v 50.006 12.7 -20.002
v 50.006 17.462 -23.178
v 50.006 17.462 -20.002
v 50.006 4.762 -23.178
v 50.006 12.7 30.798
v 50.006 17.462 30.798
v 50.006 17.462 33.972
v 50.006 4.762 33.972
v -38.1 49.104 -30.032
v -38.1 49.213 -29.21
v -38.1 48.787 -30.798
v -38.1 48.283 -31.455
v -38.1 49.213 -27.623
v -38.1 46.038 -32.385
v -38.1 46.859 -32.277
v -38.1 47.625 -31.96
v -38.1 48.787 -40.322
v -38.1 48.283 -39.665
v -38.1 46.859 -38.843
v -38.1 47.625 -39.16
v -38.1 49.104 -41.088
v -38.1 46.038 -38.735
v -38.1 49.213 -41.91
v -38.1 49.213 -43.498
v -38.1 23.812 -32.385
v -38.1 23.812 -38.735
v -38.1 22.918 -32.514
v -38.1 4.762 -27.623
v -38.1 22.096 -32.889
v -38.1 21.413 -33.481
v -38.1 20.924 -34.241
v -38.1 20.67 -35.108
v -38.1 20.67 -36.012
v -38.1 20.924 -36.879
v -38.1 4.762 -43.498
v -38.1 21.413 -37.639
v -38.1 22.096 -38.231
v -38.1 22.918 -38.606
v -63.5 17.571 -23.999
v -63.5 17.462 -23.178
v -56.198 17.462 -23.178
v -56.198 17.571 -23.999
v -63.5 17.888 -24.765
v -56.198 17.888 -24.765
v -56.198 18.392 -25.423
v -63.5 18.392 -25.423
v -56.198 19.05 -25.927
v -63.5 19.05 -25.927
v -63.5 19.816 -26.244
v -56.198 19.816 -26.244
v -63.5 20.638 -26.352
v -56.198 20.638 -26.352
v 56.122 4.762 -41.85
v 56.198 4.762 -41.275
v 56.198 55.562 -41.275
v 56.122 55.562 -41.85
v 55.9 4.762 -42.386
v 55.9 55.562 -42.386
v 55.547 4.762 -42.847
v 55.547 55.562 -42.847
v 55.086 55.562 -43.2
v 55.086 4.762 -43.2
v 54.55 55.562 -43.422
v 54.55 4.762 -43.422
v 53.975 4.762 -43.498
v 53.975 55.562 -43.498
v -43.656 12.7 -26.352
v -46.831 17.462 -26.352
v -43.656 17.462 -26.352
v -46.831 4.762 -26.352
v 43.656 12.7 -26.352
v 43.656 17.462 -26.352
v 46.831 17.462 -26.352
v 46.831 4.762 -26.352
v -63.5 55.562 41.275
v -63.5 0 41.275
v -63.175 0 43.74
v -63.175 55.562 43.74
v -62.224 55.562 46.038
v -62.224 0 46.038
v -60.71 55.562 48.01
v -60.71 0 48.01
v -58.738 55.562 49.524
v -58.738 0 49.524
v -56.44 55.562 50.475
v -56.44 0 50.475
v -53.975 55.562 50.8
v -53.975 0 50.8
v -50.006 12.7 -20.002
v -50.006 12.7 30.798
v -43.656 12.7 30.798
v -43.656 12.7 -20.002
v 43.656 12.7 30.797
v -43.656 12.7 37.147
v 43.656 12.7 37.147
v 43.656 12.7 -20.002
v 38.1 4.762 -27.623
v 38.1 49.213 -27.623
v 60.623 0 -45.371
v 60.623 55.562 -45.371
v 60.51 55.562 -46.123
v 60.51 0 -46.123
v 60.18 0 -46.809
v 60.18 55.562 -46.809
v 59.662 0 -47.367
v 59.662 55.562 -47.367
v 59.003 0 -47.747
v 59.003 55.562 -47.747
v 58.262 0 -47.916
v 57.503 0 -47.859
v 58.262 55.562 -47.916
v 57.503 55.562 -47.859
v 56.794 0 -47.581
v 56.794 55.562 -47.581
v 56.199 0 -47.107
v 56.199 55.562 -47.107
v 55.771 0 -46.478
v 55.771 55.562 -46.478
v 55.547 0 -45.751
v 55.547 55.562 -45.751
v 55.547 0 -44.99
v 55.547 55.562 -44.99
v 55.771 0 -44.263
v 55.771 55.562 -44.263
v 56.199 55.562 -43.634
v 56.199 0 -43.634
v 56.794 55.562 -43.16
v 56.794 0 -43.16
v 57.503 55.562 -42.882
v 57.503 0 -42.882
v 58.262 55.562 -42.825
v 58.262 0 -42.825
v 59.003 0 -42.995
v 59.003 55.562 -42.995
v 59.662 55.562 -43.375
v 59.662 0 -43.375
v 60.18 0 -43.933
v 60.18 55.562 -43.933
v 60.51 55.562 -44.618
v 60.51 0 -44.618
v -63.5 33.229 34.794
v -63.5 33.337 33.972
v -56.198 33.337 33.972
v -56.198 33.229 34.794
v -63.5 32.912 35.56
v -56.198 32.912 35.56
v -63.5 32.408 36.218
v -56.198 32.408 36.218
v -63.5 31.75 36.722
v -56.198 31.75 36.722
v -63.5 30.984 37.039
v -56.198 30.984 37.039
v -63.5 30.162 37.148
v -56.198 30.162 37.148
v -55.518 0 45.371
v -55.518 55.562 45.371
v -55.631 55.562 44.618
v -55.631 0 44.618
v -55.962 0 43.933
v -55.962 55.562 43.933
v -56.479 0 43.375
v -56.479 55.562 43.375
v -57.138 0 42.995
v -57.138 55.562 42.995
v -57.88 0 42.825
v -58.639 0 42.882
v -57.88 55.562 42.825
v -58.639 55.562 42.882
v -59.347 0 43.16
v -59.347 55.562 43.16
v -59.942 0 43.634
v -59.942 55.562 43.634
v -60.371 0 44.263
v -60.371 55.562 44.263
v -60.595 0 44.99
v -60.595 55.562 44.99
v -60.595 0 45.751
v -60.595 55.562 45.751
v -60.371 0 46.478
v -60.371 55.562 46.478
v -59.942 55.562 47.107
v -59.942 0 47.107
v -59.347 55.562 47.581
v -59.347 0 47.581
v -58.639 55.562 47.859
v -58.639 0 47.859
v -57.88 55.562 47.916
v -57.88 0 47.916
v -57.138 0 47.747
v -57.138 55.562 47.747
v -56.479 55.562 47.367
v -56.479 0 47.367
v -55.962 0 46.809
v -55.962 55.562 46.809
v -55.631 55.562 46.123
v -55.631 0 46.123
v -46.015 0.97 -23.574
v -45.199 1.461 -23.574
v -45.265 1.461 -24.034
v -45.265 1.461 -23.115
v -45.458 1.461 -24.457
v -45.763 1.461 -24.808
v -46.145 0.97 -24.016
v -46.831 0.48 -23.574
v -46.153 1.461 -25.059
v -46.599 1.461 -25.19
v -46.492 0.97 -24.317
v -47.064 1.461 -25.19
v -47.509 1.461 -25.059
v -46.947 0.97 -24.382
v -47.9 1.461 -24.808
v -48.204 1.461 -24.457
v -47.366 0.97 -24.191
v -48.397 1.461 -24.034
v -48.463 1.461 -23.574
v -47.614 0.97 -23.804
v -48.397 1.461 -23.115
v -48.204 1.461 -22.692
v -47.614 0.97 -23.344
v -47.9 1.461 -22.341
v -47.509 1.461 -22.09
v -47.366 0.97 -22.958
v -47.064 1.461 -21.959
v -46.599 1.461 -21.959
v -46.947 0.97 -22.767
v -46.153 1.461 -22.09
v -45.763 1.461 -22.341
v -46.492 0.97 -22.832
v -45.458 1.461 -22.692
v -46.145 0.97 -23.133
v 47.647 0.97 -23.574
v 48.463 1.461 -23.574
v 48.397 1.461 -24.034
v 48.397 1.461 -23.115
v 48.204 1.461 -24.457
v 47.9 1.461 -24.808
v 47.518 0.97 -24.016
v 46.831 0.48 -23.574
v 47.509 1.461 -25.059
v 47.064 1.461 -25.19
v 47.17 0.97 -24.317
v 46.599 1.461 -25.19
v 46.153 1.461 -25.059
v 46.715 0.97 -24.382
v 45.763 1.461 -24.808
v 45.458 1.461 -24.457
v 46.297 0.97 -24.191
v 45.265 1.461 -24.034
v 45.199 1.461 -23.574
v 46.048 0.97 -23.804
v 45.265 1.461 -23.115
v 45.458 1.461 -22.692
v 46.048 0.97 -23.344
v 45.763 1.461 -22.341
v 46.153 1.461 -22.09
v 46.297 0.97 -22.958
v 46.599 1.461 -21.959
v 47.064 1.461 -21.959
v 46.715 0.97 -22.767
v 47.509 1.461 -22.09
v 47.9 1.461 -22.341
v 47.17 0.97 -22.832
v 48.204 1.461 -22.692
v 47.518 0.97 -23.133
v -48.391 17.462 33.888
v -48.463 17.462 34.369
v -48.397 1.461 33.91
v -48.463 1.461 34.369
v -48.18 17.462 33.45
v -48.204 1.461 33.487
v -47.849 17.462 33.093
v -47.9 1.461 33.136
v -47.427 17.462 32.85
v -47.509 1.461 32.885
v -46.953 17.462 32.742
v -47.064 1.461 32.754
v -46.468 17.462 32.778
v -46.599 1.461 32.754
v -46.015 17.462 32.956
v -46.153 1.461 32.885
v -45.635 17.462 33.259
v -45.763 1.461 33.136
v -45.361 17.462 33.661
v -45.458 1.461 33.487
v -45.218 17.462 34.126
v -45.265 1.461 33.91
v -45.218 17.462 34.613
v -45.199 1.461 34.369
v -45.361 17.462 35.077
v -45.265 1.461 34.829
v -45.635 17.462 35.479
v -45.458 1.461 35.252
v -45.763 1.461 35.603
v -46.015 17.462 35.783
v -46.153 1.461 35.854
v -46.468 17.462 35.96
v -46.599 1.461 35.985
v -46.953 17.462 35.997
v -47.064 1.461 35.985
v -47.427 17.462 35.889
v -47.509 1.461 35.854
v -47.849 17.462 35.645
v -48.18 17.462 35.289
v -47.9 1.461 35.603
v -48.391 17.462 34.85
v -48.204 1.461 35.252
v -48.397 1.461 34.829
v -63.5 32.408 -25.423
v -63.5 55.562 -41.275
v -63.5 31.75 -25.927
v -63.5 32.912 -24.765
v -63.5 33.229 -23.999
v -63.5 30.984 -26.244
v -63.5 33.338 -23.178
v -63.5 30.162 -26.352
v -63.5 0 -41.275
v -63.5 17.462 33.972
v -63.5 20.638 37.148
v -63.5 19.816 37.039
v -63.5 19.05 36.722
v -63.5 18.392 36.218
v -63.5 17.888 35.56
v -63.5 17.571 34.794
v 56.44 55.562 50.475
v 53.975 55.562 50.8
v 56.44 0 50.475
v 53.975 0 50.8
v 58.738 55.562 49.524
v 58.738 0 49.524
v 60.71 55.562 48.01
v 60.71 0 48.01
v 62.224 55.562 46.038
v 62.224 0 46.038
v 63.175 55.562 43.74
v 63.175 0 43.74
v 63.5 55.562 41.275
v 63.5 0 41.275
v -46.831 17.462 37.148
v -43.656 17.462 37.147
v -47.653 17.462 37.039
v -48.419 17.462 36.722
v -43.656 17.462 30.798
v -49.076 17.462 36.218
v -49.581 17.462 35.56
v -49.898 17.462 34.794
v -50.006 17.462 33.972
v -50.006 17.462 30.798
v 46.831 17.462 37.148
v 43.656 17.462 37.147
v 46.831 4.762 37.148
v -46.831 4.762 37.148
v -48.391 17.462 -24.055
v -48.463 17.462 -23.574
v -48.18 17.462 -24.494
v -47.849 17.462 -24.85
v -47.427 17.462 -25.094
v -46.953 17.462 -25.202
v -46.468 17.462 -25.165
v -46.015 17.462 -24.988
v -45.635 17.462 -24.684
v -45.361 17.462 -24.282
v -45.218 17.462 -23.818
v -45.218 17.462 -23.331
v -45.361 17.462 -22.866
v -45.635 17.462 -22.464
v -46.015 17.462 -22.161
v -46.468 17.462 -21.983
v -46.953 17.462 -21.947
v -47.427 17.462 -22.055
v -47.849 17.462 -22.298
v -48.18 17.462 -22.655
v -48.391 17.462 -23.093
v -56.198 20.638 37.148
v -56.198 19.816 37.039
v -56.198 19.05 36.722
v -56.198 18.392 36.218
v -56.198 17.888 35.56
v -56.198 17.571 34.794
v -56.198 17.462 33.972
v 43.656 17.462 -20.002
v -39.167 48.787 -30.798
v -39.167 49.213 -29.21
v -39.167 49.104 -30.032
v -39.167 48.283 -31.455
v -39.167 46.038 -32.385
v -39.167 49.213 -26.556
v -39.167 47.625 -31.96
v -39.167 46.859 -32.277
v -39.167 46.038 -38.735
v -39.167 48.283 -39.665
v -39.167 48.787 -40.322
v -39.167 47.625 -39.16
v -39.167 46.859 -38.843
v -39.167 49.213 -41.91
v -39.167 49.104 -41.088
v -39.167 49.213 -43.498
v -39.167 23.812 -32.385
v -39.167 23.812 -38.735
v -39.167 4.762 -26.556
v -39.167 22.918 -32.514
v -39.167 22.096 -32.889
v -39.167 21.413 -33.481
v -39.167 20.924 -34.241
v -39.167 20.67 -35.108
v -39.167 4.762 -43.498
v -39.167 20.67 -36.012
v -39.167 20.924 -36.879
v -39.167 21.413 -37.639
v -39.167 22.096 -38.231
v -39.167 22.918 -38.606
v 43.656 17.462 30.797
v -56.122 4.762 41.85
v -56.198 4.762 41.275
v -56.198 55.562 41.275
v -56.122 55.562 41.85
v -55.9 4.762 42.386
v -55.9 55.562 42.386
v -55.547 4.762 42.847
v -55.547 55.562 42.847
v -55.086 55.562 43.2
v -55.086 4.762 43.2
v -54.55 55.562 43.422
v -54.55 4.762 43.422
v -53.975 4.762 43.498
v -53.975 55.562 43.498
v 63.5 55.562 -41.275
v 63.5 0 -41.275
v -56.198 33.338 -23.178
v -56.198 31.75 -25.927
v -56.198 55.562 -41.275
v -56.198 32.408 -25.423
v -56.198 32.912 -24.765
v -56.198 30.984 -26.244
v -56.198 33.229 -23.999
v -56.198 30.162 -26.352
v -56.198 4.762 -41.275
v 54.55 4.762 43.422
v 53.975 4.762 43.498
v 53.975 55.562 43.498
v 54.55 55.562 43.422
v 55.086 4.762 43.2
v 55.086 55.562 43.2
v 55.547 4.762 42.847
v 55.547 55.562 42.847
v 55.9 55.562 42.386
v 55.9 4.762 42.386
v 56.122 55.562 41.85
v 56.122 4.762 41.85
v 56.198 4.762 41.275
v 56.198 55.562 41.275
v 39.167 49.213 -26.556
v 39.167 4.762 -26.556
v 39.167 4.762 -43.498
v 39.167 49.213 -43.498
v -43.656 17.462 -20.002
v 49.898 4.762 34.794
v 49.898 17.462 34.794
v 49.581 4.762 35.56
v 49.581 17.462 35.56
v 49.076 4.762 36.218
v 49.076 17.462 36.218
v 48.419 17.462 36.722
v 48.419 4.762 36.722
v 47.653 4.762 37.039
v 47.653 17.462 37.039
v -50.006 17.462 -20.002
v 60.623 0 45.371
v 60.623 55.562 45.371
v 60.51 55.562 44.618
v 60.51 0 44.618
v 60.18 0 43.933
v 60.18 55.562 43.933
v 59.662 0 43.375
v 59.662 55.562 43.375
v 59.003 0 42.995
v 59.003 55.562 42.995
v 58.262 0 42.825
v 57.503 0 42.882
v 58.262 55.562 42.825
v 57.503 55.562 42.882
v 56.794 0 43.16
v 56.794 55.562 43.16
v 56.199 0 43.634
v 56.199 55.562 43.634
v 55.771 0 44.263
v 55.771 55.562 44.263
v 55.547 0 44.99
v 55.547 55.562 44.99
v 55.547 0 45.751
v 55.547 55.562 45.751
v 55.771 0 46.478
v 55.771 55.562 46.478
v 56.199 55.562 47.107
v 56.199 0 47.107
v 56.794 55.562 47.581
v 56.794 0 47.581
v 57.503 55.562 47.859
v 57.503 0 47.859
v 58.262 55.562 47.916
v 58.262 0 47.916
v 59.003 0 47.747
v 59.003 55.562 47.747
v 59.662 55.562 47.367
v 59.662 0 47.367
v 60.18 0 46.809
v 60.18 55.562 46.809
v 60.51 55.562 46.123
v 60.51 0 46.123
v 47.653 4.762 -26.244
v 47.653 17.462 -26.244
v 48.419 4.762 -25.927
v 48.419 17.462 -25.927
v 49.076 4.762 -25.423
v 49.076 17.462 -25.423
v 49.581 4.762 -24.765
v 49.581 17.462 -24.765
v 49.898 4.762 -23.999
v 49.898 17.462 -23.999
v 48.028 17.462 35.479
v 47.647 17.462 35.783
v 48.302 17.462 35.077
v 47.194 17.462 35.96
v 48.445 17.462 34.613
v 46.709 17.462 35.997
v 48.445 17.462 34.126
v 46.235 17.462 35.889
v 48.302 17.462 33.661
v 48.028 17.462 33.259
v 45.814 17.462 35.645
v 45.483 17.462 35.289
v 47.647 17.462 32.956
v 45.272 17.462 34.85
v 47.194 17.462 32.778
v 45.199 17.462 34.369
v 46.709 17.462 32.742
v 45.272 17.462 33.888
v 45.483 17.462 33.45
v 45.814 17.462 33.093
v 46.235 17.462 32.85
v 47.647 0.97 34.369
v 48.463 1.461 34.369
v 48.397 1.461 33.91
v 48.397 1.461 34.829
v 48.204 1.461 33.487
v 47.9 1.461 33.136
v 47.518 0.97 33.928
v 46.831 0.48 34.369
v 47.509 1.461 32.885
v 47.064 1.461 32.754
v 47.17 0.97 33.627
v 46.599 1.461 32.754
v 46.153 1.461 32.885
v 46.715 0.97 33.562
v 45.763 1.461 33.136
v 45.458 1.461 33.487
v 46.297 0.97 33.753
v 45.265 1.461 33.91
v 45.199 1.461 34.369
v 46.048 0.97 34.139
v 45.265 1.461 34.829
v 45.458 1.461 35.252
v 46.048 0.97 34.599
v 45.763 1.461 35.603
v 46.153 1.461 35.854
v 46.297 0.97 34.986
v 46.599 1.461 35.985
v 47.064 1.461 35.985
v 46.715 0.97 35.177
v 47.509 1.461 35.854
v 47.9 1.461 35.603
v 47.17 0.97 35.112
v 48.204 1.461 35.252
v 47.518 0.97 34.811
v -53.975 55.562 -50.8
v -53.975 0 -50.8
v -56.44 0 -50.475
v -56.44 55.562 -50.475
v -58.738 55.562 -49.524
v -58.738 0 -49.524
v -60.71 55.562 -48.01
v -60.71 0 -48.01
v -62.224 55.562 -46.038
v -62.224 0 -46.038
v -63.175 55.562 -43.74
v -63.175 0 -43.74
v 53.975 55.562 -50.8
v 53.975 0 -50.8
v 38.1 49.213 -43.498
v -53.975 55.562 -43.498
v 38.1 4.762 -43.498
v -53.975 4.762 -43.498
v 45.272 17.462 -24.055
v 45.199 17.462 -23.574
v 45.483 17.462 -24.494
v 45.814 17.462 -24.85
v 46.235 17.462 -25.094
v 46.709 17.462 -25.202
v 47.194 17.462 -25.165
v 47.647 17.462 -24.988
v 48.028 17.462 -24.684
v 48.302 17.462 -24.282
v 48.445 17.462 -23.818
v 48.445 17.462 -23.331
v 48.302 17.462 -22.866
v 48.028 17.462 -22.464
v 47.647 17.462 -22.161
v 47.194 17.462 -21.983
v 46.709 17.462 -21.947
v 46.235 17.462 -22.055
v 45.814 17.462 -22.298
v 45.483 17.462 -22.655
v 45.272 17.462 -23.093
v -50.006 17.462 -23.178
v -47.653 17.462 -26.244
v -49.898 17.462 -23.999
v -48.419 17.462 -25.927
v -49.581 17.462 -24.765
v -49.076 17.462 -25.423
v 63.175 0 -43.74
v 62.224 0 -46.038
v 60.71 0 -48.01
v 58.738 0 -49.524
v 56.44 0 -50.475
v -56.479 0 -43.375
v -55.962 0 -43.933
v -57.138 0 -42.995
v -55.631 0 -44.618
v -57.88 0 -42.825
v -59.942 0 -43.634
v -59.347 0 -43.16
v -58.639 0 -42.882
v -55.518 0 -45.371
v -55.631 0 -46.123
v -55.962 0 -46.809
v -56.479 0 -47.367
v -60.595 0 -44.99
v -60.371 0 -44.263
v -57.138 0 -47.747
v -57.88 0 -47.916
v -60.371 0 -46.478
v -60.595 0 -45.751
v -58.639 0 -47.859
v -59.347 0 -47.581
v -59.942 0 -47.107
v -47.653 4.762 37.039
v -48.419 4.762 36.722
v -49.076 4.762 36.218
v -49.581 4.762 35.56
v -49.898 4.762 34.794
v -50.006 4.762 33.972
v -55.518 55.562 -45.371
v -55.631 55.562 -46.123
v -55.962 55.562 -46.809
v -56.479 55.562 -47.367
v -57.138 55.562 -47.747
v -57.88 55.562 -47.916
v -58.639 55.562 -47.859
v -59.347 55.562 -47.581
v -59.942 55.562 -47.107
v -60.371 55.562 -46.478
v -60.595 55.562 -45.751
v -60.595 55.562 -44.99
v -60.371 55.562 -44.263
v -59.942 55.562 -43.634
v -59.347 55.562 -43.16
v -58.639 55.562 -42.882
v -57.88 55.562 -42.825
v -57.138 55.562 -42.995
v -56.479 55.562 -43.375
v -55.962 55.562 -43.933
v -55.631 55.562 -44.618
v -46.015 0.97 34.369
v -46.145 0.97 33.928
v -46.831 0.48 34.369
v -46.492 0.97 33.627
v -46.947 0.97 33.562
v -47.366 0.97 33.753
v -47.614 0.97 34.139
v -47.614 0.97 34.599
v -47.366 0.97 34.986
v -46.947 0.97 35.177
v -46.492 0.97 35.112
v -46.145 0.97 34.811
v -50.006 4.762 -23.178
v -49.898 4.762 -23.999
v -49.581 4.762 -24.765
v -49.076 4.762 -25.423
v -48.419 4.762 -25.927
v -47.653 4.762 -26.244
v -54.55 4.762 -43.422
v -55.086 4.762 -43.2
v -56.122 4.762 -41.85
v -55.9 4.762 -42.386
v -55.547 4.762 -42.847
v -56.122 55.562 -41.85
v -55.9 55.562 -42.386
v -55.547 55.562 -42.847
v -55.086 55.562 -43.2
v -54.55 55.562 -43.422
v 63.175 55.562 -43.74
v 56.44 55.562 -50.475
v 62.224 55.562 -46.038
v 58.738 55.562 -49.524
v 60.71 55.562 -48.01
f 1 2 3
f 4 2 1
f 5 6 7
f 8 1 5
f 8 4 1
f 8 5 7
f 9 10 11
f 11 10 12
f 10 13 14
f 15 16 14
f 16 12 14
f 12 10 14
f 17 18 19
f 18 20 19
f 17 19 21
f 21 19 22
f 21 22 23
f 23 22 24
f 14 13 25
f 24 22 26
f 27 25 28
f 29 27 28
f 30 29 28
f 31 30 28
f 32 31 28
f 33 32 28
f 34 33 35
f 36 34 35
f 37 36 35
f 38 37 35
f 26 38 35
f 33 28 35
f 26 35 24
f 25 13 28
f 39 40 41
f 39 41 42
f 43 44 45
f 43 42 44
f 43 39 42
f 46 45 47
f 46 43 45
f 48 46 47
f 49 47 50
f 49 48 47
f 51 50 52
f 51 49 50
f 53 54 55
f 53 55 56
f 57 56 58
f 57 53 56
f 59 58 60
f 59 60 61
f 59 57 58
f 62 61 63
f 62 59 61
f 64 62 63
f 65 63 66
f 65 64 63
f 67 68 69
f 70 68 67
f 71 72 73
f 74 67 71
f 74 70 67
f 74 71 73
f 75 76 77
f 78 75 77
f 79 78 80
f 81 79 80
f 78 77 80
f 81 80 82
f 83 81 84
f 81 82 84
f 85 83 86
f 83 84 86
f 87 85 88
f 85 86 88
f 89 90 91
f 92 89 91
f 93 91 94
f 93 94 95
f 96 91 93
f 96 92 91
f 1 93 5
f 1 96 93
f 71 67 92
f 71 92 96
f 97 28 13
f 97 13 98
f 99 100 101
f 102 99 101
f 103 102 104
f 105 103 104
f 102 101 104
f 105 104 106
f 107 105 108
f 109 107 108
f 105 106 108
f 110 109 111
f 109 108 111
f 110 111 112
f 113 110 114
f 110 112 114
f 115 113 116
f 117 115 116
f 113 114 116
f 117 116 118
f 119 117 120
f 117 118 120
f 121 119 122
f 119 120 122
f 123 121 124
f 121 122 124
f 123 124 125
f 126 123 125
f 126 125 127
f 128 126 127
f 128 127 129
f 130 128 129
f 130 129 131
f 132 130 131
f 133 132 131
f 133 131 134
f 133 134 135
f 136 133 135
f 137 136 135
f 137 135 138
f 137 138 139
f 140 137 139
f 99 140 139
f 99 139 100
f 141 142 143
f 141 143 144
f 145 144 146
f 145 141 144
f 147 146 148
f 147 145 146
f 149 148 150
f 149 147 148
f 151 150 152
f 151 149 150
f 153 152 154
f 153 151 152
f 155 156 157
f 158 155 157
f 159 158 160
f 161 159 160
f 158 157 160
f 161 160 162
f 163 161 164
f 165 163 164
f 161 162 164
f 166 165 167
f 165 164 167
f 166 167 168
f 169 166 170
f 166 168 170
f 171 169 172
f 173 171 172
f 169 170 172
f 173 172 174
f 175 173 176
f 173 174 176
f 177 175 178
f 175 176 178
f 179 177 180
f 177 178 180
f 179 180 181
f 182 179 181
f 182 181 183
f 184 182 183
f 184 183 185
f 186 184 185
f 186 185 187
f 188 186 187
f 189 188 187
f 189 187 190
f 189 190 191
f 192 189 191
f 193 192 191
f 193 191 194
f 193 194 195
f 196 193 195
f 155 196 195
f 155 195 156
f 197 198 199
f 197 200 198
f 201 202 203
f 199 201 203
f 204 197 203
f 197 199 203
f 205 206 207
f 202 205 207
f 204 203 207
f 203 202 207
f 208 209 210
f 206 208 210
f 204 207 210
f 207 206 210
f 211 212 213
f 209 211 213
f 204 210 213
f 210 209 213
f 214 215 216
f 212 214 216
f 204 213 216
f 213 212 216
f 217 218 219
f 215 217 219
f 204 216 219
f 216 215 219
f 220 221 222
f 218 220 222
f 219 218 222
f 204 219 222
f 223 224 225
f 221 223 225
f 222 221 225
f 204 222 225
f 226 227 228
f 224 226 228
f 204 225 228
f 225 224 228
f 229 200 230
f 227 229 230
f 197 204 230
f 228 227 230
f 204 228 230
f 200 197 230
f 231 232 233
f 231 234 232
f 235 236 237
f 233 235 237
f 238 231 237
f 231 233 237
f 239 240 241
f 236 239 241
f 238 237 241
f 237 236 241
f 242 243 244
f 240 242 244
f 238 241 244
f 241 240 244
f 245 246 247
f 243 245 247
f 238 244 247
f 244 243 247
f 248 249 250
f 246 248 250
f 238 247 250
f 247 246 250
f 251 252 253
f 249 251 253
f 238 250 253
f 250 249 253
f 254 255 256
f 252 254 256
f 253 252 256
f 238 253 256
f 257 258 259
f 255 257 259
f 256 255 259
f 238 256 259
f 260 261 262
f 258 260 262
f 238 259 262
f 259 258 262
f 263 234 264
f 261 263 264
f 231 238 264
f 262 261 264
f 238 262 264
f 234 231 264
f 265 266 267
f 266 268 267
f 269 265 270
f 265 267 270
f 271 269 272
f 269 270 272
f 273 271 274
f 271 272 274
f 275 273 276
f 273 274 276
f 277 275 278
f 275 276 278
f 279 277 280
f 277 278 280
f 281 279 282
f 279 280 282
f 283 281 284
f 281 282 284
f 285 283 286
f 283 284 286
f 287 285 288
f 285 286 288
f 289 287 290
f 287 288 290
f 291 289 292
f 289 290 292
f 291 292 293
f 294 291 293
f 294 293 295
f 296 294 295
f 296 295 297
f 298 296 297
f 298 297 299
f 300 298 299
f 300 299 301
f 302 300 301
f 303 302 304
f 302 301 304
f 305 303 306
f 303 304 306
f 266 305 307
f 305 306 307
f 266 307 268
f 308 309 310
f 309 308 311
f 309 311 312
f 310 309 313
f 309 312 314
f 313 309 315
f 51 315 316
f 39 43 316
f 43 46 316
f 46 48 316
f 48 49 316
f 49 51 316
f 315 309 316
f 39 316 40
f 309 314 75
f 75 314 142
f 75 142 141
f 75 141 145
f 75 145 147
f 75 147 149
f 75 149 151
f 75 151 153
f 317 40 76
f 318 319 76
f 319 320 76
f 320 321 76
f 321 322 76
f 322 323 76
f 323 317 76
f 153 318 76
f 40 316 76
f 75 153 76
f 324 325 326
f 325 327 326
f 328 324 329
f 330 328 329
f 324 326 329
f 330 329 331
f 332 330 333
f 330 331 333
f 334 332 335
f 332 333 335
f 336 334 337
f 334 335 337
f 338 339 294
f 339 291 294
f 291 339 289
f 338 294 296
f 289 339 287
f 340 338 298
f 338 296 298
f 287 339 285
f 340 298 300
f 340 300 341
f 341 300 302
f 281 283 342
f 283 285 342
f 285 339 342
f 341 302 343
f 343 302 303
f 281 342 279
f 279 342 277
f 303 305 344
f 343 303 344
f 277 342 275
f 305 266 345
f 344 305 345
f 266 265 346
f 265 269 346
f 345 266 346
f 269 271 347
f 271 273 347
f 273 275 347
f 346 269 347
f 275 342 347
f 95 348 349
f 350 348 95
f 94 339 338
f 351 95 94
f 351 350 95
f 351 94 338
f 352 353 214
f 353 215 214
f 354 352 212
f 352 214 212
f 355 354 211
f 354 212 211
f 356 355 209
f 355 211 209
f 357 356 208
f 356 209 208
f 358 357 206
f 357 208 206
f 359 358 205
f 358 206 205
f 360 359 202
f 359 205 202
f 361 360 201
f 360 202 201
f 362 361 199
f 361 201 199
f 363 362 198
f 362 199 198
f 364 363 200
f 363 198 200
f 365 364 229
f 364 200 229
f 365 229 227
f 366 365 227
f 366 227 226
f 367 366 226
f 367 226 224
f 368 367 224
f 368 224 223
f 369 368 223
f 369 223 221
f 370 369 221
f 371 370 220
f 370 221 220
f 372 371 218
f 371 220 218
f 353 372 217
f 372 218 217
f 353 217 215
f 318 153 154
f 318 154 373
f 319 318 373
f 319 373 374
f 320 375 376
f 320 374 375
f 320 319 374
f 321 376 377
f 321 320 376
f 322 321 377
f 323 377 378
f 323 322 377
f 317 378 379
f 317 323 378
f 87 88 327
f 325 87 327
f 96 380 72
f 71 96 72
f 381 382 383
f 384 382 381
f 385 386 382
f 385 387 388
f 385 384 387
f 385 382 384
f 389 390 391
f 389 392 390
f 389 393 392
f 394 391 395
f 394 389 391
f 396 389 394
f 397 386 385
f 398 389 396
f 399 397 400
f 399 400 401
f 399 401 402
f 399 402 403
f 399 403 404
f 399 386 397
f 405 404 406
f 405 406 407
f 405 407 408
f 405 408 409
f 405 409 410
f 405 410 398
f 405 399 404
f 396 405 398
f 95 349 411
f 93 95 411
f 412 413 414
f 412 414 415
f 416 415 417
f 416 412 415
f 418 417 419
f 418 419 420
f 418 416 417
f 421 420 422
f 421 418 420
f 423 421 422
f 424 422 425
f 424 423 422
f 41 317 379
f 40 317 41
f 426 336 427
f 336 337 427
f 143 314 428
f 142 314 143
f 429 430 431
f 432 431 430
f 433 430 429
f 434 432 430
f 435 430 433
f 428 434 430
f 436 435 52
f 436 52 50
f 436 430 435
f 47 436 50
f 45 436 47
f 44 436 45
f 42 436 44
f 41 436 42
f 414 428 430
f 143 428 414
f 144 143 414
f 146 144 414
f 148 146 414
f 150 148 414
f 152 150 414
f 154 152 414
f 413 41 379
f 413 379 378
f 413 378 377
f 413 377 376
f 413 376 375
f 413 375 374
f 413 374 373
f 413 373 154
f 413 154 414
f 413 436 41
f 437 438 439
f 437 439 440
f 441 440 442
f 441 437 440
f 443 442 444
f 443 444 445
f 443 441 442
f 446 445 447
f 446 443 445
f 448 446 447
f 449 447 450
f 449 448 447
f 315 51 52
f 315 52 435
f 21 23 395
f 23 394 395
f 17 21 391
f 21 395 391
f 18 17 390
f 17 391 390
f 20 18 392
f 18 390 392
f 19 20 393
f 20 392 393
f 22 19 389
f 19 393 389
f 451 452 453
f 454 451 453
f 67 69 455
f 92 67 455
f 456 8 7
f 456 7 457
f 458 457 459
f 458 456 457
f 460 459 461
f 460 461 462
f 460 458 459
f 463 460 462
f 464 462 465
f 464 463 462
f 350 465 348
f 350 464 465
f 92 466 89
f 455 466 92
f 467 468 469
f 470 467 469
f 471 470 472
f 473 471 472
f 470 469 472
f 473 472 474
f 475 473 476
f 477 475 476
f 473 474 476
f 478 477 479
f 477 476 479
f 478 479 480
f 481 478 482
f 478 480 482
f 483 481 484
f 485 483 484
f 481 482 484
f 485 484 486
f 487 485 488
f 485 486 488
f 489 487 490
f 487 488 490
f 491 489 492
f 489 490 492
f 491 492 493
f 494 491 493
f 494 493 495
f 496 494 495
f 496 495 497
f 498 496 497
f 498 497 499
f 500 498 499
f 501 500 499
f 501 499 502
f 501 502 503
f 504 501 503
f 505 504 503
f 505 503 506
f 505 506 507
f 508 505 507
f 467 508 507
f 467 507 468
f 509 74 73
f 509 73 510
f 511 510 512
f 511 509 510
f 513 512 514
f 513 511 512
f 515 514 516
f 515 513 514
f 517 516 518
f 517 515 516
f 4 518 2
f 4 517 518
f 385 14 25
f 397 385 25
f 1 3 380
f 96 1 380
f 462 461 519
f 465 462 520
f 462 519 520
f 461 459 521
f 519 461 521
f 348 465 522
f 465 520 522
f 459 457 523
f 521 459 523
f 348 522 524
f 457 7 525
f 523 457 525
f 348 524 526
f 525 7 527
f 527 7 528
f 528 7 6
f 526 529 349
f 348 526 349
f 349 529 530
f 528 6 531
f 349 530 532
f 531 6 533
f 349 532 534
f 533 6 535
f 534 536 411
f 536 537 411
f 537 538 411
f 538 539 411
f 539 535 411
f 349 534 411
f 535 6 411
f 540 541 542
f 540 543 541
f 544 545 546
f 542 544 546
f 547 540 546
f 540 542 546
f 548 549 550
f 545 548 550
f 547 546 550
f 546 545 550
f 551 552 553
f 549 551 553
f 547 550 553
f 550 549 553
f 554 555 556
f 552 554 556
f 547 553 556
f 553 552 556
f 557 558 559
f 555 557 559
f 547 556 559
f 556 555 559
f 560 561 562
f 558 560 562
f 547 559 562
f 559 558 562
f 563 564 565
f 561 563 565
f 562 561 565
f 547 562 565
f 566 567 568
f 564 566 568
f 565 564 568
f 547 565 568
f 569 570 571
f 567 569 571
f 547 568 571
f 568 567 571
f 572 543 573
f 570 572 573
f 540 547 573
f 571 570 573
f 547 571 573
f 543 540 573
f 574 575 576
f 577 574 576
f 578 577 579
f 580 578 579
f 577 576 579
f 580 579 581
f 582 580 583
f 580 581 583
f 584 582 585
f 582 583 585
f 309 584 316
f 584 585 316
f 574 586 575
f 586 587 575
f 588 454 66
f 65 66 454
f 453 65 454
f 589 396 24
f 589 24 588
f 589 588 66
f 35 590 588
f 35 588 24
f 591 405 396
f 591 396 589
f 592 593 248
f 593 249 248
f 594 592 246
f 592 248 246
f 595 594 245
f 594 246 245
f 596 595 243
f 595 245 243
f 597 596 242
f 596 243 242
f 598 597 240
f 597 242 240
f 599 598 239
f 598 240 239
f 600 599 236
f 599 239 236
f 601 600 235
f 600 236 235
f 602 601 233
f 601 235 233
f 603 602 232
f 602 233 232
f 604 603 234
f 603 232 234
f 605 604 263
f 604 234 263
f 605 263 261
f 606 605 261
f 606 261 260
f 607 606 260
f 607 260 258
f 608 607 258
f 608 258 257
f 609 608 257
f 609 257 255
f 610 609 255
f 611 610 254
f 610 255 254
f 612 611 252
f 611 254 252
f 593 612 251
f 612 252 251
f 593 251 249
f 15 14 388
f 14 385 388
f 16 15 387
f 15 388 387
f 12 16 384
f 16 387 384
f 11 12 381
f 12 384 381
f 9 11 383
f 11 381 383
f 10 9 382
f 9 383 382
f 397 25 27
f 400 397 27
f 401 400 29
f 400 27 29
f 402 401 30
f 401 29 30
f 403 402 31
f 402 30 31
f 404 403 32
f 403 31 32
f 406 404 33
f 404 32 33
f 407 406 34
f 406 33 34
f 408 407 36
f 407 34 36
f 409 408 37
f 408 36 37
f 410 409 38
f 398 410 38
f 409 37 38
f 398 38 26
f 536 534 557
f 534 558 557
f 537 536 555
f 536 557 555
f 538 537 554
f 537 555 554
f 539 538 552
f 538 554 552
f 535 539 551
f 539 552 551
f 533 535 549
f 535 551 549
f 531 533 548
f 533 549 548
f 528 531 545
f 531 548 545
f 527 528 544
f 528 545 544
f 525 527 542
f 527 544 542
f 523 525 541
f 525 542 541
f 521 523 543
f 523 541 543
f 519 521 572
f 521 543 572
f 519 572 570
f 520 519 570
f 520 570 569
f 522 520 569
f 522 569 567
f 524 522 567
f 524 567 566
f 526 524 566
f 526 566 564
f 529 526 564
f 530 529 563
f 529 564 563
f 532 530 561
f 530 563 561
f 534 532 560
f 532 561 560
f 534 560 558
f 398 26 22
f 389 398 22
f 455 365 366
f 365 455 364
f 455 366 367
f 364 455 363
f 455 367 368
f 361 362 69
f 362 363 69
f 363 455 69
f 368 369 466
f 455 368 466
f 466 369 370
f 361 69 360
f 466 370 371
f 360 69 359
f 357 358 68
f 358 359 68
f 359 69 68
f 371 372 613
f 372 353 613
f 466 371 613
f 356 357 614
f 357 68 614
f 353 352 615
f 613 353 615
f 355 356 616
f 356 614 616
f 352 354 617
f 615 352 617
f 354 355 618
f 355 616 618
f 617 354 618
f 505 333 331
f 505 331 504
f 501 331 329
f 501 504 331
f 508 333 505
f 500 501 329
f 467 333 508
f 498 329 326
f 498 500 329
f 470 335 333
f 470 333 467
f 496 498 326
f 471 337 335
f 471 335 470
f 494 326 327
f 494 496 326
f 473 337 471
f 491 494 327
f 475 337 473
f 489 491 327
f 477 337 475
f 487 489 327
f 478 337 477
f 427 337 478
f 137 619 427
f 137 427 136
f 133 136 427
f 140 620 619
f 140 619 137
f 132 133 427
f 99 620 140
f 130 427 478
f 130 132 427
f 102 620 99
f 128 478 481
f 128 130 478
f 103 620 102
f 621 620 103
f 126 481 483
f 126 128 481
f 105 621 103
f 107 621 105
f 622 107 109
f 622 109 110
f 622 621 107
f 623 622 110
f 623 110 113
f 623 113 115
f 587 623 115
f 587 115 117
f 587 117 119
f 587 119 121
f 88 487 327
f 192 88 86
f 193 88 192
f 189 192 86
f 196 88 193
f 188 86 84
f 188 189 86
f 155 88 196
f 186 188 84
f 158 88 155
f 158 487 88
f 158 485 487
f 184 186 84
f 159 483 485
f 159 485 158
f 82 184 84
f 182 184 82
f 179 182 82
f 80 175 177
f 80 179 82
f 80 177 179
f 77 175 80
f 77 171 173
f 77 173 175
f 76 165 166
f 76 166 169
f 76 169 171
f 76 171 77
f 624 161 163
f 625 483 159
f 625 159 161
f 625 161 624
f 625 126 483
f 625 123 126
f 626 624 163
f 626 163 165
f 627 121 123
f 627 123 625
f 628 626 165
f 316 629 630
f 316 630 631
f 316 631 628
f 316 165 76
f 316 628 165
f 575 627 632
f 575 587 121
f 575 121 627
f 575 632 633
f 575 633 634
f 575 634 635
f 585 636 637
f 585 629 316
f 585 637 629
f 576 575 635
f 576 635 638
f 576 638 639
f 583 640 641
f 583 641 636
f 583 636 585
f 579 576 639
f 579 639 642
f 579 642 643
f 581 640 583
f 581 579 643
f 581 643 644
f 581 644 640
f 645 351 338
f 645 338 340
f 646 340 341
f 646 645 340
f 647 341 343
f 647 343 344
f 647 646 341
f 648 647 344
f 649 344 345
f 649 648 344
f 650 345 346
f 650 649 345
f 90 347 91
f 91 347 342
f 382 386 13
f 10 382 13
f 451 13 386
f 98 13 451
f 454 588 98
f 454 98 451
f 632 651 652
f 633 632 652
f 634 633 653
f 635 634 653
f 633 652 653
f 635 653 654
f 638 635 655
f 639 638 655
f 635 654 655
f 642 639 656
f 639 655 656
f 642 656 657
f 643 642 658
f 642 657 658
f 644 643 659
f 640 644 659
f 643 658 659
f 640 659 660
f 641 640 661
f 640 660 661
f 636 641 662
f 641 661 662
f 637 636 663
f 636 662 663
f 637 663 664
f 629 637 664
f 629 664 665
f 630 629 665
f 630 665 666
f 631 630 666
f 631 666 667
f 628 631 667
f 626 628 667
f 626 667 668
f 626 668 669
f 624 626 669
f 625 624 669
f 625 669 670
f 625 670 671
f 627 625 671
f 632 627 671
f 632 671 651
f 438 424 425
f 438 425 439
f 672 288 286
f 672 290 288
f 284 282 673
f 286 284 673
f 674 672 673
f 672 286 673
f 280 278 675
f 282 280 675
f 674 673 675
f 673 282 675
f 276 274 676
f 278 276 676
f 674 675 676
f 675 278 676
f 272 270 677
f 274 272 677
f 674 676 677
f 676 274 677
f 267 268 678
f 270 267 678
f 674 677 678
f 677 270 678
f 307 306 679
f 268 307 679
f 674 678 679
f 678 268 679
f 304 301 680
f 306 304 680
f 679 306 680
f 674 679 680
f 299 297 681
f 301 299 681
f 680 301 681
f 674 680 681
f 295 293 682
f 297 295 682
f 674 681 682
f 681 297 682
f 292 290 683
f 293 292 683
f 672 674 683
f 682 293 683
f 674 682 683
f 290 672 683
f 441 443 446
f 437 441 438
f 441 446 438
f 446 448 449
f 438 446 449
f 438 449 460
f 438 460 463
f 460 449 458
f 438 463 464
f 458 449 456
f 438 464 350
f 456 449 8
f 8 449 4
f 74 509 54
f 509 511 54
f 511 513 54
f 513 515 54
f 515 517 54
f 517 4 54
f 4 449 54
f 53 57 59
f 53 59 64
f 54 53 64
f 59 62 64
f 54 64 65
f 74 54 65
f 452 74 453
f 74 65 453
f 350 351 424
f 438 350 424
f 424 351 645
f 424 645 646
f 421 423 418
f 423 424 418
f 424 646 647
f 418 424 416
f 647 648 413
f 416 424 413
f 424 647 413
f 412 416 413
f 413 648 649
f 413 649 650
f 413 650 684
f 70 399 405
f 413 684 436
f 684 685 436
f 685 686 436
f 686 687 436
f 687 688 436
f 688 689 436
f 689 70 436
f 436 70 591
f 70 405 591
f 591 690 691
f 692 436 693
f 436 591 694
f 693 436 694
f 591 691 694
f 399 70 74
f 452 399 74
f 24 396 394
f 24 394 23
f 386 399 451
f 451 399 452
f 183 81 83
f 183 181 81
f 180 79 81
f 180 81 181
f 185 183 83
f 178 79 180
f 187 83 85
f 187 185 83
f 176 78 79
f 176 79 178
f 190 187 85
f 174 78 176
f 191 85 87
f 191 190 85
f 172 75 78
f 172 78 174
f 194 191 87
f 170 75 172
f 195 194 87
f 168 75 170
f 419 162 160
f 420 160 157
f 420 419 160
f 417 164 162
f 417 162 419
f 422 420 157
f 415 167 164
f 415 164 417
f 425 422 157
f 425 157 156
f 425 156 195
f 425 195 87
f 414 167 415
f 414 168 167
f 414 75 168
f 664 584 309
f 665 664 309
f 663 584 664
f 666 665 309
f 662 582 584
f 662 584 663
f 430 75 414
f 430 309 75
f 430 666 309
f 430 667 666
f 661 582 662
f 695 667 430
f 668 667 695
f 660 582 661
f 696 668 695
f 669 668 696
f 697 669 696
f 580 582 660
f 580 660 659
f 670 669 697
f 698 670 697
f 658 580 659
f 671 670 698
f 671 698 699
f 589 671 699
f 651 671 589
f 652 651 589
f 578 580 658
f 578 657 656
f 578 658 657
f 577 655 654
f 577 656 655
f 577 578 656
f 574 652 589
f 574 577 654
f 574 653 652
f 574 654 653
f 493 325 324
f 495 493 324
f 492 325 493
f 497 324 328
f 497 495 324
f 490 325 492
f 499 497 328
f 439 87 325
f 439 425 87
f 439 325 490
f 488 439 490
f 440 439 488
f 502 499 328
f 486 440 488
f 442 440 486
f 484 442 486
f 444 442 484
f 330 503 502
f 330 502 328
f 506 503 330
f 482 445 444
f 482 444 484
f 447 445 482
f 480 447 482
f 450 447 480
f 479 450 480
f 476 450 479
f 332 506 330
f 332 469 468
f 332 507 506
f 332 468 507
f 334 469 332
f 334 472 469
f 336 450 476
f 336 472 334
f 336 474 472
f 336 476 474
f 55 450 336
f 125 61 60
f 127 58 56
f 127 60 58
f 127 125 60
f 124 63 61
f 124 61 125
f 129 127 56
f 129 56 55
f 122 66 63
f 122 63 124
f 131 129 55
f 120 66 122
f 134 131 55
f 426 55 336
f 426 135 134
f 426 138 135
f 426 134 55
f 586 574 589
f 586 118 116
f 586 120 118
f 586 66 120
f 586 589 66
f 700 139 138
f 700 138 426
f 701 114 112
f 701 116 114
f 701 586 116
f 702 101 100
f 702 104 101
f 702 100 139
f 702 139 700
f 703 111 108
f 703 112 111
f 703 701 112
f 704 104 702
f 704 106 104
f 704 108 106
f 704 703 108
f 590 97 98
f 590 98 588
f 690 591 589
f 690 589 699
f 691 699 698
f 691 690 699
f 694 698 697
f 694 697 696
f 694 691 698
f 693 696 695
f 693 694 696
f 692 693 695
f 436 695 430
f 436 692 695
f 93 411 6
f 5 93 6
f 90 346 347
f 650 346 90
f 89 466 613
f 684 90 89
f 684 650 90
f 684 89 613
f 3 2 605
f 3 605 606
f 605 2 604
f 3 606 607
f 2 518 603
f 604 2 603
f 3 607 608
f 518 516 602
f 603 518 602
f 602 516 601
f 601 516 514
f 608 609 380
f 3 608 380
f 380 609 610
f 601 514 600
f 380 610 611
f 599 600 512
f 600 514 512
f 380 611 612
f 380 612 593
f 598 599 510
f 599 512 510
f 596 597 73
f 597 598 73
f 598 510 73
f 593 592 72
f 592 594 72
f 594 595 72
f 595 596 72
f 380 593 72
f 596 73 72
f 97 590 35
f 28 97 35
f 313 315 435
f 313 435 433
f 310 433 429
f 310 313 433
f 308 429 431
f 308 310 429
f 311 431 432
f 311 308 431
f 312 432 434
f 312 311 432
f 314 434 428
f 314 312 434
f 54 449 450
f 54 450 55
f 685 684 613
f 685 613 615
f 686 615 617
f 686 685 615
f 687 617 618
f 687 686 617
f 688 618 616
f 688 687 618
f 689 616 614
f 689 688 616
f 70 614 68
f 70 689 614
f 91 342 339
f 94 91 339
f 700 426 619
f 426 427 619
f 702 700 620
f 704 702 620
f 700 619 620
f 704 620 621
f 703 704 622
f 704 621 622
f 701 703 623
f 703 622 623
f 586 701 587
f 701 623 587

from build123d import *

# Parameters (mm, degrees)
BASE_PLATE_DEPTH                        = 4.7625
OUTSIDEBOSS_DEPTH                       = 50.8
TOPPLATE_MOUNTINGHOLE_8_0_199_DIAMETE_D = 5.1054
PCB_PLATE_DEPTH                         = 12.7
F_4_CLEARANCE_HOLE1_D                   = 3.2639
F_4_CLEARANCE_HOLE1_DEPTH               = 16.002
F_4_CLEARANCE_HOLE1_TIP                 = 0.980574487
SKETCH11_W                              = 87.3125
SKETCH11_H                              = 50.8
SKETCH11_W_2                            = 6.35
SKETCH11_H_2                            = 6.35
CUT_EXTRUDE2_DEPTH                      = 4.7625
SKETCH12_W                              = 78.3336
SKETCH12_H                              = 18.0086
SKETCH12_W_2                            = 76.2
SKETCH12_H_2                            = 15.875
BATTERYHOLDER_DEPTH                     = 44.45
BATTERYLEADFEADER_REACH                 = 128.453
BATTERYLEADFILLETS_R                    = 3.175
CUT_EXTRUDE3_REACH                      = 149.637


with BuildPart() as part:
    # Sketch1 → Base_Plate (new body)
    with BuildSketch(Plane(origin=(0, 0, 0), x_dir=(1, 0, 0), z_dir=(0, 1, 0))):
        with BuildLine():
            Line((-53.975, 50.8), (53.975, 50.8))
            ThreePointArc((53.975, 50.8), (60.710192091, 48.010192091), (63.5, 41.275))
            Line((63.5, 41.275), (63.5, -41.275))
            ThreePointArc((63.5, -41.275), (60.710192091, -48.010192091), (53.975, -50.8))
            Line((53.975, -50.8), (-53.975, -50.8))
            ThreePointArc((-53.975, -50.8), (-60.710192091, -48.010192091), (-63.5, -41.275))
            Line((-63.5, -41.275), (-63.5, 41.275))
            ThreePointArc((-63.5, 41.275), (-60.710192091, 48.010192091), (-53.975, 50.8))
        make_face()
    extrude(amount=BASE_PLATE_DEPTH)

    # Sketch2 → OutsideBoss (add)
    with BuildSketch(Plane(origin=(0, 4.7625, 0), x_dir=(1, 0, 0), z_dir=(0, 1, 0))):
        with BuildLine():
            Line((-53.975, -50.8), (53.975, -50.8))
            ThreePointArc((53.975, -50.8), (60.710192091, -48.010192091), (63.5, -41.275))
            Line((63.5, -41.275), (63.5, 41.275))
            ThreePointArc((63.5, 41.275), (60.710192091, 48.010192091), (53.975, 50.8))
            Line((53.975, 50.8), (-53.975, 50.8))
            ThreePointArc((-53.975, 50.8), (-60.710192091, 48.010192091), (-63.5, 41.275))
            Line((-63.5, 41.275), (-63.5, -41.275))
            ThreePointArc((-63.5, -41.275), (-60.710192091, -48.010192091), (-53.975, -50.8))
        make_face()
        with BuildLine():
            Line((-56.1975, 41.275), (-56.1975, -41.275))
            ThreePointArc((-56.1975, -41.275), (-55.546544821, -42.846544821), (-53.975, -43.4975))
            Line((-53.975, -43.4975), (53.975, -43.4975))
            ThreePointArc((53.975, -43.4975), (55.546544821, -42.846544821), (56.1975, -41.275))
            Line((56.1975, -41.275), (56.1975, 41.275))
            ThreePointArc((56.1975, 41.275), (55.546544821, 42.846544821), (53.975, 43.4975))
            Line((53.975, 43.4975), (-53.975, 43.4975))
            ThreePointArc((-53.975, 43.4975), (-55.546544821, 42.846544821), (-56.1975, 41.275))
        make_face(mode=Mode.SUBTRACT)
    extrude(amount=OUTSIDEBOSS_DEPTH)

    # TopPlate_MountingHole_#8 (0.199) Diameter Hole1 (through all)
    with Locations(Plane(origin=(0, 0, 0), x_dir=(-1, 0, 0), z_dir=(0, -1, 0))):
        with Locations((-58.07075, 45.37075), (58.07075, -45.37075), (-58.07075, -45.37075), (58.07075, 45.37075)):
            Hole(TOPPLATE_MOUNTINGHOLE_8_0_199_DIAMETE_D / 2)

    # Sketch8 → PCB_Plate (add)
    with BuildSketch(Plane(origin=(0, 4.7625, 0), x_dir=(1, 0, 0), z_dir=(0, 1, 0))):
        with BuildLine():
            Line((46.83125, -37.1475), (-46.83125, -37.1475))
            ThreePointArc((-46.83125, -37.1475), (-49.07631403, -36.21756403), (-50.00625, -33.9725))
            Line((-50.00625, -33.9725), (-50.00625, 23.1775))
            ThreePointArc((-50.00625, 23.1775), (-49.07631403, 25.42256403), (-46.83125, 26.3525))
            Line((-46.83125, 26.3525), (46.83125, 26.3525))
            ThreePointArc((46.83125, 26.3525), (49.07631403, 25.42256403), (50.00625, 23.1775))
            Line((50.00625, 23.1775), (50.00625, -33.9725))
            ThreePointArc((50.00625, -33.9725), (49.07631403, -36.21756403), (46.83125, -37.1475))
        make_face()
    extrude(amount=PCB_PLATE_DEPTH)

    # #4 Clearance Hole1
    with Locations(Plane(origin=(0, 17.4625, 0), x_dir=(1, 0, 0), z_dir=(0, 1, 0))):
        with Locations((-46.83125, 23.574375), (46.83125, 23.574375), (-46.83125, -34.369375), (46.83125, -34.369375)):
            Hole(F_4_CLEARANCE_HOLE1_D / 2, depth=F_4_CLEARANCE_HOLE1_DEPTH)
            with Locations((0, 0, -(F_4_CLEARANCE_HOLE1_DEPTH + F_4_CLEARANCE_HOLE1_TIP / 2))):  # 118° drill point
                Cone(0, F_4_CLEARANCE_HOLE1_D / 2, F_4_CLEARANCE_HOLE1_TIP, mode=Mode.SUBTRACT)

    # Sketch11 → Cut-Extrude2 (cut)
    with BuildSketch(Plane(origin=(0, 17.4625, 0), x_dir=(1, 0, 0), z_dir=(0, 1, 0))):
        with Locations((0, -5.3975)):
            Rectangle(SKETCH11_W, SKETCH11_H)
        with Locations((46.83125, -5.3975)):
            Rectangle(SKETCH11_W_2, SKETCH11_H)
        with Locations((0, 23.1775)):
            Rectangle(SKETCH11_W, SKETCH11_H_2)
        with Locations((0, -33.9725)):
            Rectangle(SKETCH11_W, SKETCH11_H_2)
        with Locations((-46.83125, -5.3975)):
            Rectangle(SKETCH11_W_2, SKETCH11_H)
    extrude(amount=-CUT_EXTRUDE2_DEPTH, mode=Mode.SUBTRACT)

    # Sketch12 → BatteryHolder (add)
    with BuildSketch(Plane(origin=(0, 4.7625, 0), x_dir=(1, 0, 0), z_dir=(0, 1, 0))):
        with Locations((0, 35.56)):
            Rectangle(SKETCH12_W, SKETCH12_H)
        with Locations((0, 35.56)):
            Rectangle(SKETCH12_W_2, SKETCH12_H_2, mode=Mode.SUBTRACT)
    extrude(amount=BATTERYHOLDER_DEPTH)

    # Sketch13 → BatteryLeadFeader (cut, up to next)
    with BuildSketch(Plane(origin=(-38.1, 0, 0), x_dir=(0, 0, -1), z_dir=(1, 0, 0)), mode=Mode.PRIVATE) as batteryleadfeader_sk1:
        with BuildLine():
            Line((38.735, 23.8125), (38.735, 49.2125))
            Line((38.735, 49.2125), (32.385, 49.2125))
            Line((32.385, 49.2125), (32.385, 23.8125))
            ThreePointArc((32.385, 23.8125), (35.56, 26.9875), (38.735, 23.8125))
        make_face()
    batteryleadfeader_tool1 = extrude(batteryleadfeader_sk1.sketch, amount=-BATTERYLEADFEADER_REACH, mode=Mode.PRIVATE) & part.part
    # Sketch13 → BatteryLeadFeader (cut, up to next)
    with BuildSketch(Plane(origin=(-38.1, 0, 0), x_dir=(0, 0, -1), z_dir=(1, 0, 0)), mode=Mode.PRIVATE) as batteryleadfeader_sk2:
        with BuildLine():
            ThreePointArc((32.385, 23.8125), (35.56, 20.6375), (38.735, 23.8125))
            Line((38.735, 23.8125), (32.385, 23.8125))
        make_face()
    batteryleadfeader_tool2 = extrude(batteryleadfeader_sk2.sketch, amount=-BATTERYLEADFEADER_REACH, mode=Mode.PRIVATE) & part.part
    # Sketch13 → BatteryLeadFeader (cut, up to next)
    with BuildSketch(Plane(origin=(-38.1, 0, 0), x_dir=(0, 0, -1), z_dir=(1, 0, 0)), mode=Mode.PRIVATE) as batteryleadfeader_sk3:
        with BuildLine():
            Line((32.385, 23.8125), (38.735, 23.8125))
            ThreePointArc((38.735, 23.8125), (35.56, 26.9875), (32.385, 23.8125))
        make_face()
    batteryleadfeader_tool3 = extrude(batteryleadfeader_sk3.sketch, amount=-BATTERYLEADFEADER_REACH, mode=Mode.PRIVATE) & part.part
    # Sketch13 → BatteryLeadFeader (cut, up to next)
    with BuildSketch(Plane(origin=(-38.1, 0, 0), x_dir=(0, 0, -1), z_dir=(1, 0, 0)), mode=Mode.PRIVATE) as batteryleadfeader_sk4:
        with BuildLine():
            ThreePointArc((32.385, 23.8125), (35.56, 20.6375), (38.735, 23.8125))
            Line((38.735, 23.8125), (32.385, 23.8125))
        make_face()
    batteryleadfeader_tool4 = extrude(batteryleadfeader_sk4.sketch, amount=-BATTERYLEADFEADER_REACH, mode=Mode.PRIVATE) & part.part
    # Sketch13 → BatteryLeadFeader (cut, up to next)
    with BuildSketch(Plane(origin=(-38.1, 0, 0), x_dir=(0, 0, -1), z_dir=(1, 0, 0)), mode=Mode.PRIVATE) as batteryleadfeader_sk5:
        with BuildLine():
            Line((32.385, 23.8125), (38.735, 23.8125))
            ThreePointArc((38.735, 23.8125), (35.56, 26.9875), (32.385, 23.8125))
        make_face()
    batteryleadfeader_tool5 = extrude(batteryleadfeader_sk5.sketch, amount=-BATTERYLEADFEADER_REACH, mode=Mode.PRIVATE) & part.part
    add(batteryleadfeader_tool1.solids().sort_by_distance((-38.1, 37.748358, -35.56))[0], mode=Mode.SUBTRACT)
    add(batteryleadfeader_tool2.solids().sort_by_distance((-38.1, 22.464988, -35.56))[0], mode=Mode.SUBTRACT)
    add(batteryleadfeader_tool3.solids().sort_by_distance((-38.1, 25.160012, -35.56))[0], mode=Mode.SUBTRACT)
    add(batteryleadfeader_tool4.solids().sort_by_distance((-38.1, 22.464988, -35.56))[0], mode=Mode.SUBTRACT)
    add(batteryleadfeader_tool5.solids().sort_by_distance((-38.1, 25.160012, -35.56))[0], mode=Mode.SUBTRACT)

    # BatteryLeadFillets
    batteryleadfillets_edges = [part.edges().sort_by_distance(p)[0] for p in [
        (-38.6334, 49.2125, -38.735),
        (-38.6334, 49.2125, -32.385),
    ]]
    fillet(batteryleadfillets_edges, radius=BATTERYLEADFILLETS_R)

    # Sketch14 → Cut-Extrude3 (cut, up to next)
    with BuildSketch(Plane.ZY.offset(63.5), mode=Mode.PRIVATE) as cut_extrude3_sk1:
        with BuildLine():
            Line((-26.3525, 20.6375), (-26.3525, 30.1625))
            ThreePointArc((-26.3525, 30.1625), (-25.42256403, 32.40756403), (-23.1775, 33.3375))
            Line((-23.1775, 33.3375), (33.9725, 33.3375))
            ThreePointArc((33.9725, 33.3375), (36.21756403, 32.40756403), (37.1475, 30.1625))
            Line((37.1475, 30.1625), (37.1475, 20.6375))
            ThreePointArc((37.1475, 20.6375), (36.21756403, 18.39243597), (33.9725, 17.4625))
            Line((33.9725, 17.4625), (-23.1775, 17.4625))
            ThreePointArc((-23.1775, 17.4625), (-25.42256403, 18.39243597), (-26.3525, 20.6375))
        make_face()
    cut_extrude3_tool1 = extrude(cut_extrude3_sk1.sketch, amount=-CUT_EXTRUDE3_REACH, mode=Mode.PRIVATE) & part.part
    add(cut_extrude3_tool1.solids().sort_by_distance((-63.5, 25.4, 5.3975))[0], mode=Mode.SUBTRACT)


solid = part.part
